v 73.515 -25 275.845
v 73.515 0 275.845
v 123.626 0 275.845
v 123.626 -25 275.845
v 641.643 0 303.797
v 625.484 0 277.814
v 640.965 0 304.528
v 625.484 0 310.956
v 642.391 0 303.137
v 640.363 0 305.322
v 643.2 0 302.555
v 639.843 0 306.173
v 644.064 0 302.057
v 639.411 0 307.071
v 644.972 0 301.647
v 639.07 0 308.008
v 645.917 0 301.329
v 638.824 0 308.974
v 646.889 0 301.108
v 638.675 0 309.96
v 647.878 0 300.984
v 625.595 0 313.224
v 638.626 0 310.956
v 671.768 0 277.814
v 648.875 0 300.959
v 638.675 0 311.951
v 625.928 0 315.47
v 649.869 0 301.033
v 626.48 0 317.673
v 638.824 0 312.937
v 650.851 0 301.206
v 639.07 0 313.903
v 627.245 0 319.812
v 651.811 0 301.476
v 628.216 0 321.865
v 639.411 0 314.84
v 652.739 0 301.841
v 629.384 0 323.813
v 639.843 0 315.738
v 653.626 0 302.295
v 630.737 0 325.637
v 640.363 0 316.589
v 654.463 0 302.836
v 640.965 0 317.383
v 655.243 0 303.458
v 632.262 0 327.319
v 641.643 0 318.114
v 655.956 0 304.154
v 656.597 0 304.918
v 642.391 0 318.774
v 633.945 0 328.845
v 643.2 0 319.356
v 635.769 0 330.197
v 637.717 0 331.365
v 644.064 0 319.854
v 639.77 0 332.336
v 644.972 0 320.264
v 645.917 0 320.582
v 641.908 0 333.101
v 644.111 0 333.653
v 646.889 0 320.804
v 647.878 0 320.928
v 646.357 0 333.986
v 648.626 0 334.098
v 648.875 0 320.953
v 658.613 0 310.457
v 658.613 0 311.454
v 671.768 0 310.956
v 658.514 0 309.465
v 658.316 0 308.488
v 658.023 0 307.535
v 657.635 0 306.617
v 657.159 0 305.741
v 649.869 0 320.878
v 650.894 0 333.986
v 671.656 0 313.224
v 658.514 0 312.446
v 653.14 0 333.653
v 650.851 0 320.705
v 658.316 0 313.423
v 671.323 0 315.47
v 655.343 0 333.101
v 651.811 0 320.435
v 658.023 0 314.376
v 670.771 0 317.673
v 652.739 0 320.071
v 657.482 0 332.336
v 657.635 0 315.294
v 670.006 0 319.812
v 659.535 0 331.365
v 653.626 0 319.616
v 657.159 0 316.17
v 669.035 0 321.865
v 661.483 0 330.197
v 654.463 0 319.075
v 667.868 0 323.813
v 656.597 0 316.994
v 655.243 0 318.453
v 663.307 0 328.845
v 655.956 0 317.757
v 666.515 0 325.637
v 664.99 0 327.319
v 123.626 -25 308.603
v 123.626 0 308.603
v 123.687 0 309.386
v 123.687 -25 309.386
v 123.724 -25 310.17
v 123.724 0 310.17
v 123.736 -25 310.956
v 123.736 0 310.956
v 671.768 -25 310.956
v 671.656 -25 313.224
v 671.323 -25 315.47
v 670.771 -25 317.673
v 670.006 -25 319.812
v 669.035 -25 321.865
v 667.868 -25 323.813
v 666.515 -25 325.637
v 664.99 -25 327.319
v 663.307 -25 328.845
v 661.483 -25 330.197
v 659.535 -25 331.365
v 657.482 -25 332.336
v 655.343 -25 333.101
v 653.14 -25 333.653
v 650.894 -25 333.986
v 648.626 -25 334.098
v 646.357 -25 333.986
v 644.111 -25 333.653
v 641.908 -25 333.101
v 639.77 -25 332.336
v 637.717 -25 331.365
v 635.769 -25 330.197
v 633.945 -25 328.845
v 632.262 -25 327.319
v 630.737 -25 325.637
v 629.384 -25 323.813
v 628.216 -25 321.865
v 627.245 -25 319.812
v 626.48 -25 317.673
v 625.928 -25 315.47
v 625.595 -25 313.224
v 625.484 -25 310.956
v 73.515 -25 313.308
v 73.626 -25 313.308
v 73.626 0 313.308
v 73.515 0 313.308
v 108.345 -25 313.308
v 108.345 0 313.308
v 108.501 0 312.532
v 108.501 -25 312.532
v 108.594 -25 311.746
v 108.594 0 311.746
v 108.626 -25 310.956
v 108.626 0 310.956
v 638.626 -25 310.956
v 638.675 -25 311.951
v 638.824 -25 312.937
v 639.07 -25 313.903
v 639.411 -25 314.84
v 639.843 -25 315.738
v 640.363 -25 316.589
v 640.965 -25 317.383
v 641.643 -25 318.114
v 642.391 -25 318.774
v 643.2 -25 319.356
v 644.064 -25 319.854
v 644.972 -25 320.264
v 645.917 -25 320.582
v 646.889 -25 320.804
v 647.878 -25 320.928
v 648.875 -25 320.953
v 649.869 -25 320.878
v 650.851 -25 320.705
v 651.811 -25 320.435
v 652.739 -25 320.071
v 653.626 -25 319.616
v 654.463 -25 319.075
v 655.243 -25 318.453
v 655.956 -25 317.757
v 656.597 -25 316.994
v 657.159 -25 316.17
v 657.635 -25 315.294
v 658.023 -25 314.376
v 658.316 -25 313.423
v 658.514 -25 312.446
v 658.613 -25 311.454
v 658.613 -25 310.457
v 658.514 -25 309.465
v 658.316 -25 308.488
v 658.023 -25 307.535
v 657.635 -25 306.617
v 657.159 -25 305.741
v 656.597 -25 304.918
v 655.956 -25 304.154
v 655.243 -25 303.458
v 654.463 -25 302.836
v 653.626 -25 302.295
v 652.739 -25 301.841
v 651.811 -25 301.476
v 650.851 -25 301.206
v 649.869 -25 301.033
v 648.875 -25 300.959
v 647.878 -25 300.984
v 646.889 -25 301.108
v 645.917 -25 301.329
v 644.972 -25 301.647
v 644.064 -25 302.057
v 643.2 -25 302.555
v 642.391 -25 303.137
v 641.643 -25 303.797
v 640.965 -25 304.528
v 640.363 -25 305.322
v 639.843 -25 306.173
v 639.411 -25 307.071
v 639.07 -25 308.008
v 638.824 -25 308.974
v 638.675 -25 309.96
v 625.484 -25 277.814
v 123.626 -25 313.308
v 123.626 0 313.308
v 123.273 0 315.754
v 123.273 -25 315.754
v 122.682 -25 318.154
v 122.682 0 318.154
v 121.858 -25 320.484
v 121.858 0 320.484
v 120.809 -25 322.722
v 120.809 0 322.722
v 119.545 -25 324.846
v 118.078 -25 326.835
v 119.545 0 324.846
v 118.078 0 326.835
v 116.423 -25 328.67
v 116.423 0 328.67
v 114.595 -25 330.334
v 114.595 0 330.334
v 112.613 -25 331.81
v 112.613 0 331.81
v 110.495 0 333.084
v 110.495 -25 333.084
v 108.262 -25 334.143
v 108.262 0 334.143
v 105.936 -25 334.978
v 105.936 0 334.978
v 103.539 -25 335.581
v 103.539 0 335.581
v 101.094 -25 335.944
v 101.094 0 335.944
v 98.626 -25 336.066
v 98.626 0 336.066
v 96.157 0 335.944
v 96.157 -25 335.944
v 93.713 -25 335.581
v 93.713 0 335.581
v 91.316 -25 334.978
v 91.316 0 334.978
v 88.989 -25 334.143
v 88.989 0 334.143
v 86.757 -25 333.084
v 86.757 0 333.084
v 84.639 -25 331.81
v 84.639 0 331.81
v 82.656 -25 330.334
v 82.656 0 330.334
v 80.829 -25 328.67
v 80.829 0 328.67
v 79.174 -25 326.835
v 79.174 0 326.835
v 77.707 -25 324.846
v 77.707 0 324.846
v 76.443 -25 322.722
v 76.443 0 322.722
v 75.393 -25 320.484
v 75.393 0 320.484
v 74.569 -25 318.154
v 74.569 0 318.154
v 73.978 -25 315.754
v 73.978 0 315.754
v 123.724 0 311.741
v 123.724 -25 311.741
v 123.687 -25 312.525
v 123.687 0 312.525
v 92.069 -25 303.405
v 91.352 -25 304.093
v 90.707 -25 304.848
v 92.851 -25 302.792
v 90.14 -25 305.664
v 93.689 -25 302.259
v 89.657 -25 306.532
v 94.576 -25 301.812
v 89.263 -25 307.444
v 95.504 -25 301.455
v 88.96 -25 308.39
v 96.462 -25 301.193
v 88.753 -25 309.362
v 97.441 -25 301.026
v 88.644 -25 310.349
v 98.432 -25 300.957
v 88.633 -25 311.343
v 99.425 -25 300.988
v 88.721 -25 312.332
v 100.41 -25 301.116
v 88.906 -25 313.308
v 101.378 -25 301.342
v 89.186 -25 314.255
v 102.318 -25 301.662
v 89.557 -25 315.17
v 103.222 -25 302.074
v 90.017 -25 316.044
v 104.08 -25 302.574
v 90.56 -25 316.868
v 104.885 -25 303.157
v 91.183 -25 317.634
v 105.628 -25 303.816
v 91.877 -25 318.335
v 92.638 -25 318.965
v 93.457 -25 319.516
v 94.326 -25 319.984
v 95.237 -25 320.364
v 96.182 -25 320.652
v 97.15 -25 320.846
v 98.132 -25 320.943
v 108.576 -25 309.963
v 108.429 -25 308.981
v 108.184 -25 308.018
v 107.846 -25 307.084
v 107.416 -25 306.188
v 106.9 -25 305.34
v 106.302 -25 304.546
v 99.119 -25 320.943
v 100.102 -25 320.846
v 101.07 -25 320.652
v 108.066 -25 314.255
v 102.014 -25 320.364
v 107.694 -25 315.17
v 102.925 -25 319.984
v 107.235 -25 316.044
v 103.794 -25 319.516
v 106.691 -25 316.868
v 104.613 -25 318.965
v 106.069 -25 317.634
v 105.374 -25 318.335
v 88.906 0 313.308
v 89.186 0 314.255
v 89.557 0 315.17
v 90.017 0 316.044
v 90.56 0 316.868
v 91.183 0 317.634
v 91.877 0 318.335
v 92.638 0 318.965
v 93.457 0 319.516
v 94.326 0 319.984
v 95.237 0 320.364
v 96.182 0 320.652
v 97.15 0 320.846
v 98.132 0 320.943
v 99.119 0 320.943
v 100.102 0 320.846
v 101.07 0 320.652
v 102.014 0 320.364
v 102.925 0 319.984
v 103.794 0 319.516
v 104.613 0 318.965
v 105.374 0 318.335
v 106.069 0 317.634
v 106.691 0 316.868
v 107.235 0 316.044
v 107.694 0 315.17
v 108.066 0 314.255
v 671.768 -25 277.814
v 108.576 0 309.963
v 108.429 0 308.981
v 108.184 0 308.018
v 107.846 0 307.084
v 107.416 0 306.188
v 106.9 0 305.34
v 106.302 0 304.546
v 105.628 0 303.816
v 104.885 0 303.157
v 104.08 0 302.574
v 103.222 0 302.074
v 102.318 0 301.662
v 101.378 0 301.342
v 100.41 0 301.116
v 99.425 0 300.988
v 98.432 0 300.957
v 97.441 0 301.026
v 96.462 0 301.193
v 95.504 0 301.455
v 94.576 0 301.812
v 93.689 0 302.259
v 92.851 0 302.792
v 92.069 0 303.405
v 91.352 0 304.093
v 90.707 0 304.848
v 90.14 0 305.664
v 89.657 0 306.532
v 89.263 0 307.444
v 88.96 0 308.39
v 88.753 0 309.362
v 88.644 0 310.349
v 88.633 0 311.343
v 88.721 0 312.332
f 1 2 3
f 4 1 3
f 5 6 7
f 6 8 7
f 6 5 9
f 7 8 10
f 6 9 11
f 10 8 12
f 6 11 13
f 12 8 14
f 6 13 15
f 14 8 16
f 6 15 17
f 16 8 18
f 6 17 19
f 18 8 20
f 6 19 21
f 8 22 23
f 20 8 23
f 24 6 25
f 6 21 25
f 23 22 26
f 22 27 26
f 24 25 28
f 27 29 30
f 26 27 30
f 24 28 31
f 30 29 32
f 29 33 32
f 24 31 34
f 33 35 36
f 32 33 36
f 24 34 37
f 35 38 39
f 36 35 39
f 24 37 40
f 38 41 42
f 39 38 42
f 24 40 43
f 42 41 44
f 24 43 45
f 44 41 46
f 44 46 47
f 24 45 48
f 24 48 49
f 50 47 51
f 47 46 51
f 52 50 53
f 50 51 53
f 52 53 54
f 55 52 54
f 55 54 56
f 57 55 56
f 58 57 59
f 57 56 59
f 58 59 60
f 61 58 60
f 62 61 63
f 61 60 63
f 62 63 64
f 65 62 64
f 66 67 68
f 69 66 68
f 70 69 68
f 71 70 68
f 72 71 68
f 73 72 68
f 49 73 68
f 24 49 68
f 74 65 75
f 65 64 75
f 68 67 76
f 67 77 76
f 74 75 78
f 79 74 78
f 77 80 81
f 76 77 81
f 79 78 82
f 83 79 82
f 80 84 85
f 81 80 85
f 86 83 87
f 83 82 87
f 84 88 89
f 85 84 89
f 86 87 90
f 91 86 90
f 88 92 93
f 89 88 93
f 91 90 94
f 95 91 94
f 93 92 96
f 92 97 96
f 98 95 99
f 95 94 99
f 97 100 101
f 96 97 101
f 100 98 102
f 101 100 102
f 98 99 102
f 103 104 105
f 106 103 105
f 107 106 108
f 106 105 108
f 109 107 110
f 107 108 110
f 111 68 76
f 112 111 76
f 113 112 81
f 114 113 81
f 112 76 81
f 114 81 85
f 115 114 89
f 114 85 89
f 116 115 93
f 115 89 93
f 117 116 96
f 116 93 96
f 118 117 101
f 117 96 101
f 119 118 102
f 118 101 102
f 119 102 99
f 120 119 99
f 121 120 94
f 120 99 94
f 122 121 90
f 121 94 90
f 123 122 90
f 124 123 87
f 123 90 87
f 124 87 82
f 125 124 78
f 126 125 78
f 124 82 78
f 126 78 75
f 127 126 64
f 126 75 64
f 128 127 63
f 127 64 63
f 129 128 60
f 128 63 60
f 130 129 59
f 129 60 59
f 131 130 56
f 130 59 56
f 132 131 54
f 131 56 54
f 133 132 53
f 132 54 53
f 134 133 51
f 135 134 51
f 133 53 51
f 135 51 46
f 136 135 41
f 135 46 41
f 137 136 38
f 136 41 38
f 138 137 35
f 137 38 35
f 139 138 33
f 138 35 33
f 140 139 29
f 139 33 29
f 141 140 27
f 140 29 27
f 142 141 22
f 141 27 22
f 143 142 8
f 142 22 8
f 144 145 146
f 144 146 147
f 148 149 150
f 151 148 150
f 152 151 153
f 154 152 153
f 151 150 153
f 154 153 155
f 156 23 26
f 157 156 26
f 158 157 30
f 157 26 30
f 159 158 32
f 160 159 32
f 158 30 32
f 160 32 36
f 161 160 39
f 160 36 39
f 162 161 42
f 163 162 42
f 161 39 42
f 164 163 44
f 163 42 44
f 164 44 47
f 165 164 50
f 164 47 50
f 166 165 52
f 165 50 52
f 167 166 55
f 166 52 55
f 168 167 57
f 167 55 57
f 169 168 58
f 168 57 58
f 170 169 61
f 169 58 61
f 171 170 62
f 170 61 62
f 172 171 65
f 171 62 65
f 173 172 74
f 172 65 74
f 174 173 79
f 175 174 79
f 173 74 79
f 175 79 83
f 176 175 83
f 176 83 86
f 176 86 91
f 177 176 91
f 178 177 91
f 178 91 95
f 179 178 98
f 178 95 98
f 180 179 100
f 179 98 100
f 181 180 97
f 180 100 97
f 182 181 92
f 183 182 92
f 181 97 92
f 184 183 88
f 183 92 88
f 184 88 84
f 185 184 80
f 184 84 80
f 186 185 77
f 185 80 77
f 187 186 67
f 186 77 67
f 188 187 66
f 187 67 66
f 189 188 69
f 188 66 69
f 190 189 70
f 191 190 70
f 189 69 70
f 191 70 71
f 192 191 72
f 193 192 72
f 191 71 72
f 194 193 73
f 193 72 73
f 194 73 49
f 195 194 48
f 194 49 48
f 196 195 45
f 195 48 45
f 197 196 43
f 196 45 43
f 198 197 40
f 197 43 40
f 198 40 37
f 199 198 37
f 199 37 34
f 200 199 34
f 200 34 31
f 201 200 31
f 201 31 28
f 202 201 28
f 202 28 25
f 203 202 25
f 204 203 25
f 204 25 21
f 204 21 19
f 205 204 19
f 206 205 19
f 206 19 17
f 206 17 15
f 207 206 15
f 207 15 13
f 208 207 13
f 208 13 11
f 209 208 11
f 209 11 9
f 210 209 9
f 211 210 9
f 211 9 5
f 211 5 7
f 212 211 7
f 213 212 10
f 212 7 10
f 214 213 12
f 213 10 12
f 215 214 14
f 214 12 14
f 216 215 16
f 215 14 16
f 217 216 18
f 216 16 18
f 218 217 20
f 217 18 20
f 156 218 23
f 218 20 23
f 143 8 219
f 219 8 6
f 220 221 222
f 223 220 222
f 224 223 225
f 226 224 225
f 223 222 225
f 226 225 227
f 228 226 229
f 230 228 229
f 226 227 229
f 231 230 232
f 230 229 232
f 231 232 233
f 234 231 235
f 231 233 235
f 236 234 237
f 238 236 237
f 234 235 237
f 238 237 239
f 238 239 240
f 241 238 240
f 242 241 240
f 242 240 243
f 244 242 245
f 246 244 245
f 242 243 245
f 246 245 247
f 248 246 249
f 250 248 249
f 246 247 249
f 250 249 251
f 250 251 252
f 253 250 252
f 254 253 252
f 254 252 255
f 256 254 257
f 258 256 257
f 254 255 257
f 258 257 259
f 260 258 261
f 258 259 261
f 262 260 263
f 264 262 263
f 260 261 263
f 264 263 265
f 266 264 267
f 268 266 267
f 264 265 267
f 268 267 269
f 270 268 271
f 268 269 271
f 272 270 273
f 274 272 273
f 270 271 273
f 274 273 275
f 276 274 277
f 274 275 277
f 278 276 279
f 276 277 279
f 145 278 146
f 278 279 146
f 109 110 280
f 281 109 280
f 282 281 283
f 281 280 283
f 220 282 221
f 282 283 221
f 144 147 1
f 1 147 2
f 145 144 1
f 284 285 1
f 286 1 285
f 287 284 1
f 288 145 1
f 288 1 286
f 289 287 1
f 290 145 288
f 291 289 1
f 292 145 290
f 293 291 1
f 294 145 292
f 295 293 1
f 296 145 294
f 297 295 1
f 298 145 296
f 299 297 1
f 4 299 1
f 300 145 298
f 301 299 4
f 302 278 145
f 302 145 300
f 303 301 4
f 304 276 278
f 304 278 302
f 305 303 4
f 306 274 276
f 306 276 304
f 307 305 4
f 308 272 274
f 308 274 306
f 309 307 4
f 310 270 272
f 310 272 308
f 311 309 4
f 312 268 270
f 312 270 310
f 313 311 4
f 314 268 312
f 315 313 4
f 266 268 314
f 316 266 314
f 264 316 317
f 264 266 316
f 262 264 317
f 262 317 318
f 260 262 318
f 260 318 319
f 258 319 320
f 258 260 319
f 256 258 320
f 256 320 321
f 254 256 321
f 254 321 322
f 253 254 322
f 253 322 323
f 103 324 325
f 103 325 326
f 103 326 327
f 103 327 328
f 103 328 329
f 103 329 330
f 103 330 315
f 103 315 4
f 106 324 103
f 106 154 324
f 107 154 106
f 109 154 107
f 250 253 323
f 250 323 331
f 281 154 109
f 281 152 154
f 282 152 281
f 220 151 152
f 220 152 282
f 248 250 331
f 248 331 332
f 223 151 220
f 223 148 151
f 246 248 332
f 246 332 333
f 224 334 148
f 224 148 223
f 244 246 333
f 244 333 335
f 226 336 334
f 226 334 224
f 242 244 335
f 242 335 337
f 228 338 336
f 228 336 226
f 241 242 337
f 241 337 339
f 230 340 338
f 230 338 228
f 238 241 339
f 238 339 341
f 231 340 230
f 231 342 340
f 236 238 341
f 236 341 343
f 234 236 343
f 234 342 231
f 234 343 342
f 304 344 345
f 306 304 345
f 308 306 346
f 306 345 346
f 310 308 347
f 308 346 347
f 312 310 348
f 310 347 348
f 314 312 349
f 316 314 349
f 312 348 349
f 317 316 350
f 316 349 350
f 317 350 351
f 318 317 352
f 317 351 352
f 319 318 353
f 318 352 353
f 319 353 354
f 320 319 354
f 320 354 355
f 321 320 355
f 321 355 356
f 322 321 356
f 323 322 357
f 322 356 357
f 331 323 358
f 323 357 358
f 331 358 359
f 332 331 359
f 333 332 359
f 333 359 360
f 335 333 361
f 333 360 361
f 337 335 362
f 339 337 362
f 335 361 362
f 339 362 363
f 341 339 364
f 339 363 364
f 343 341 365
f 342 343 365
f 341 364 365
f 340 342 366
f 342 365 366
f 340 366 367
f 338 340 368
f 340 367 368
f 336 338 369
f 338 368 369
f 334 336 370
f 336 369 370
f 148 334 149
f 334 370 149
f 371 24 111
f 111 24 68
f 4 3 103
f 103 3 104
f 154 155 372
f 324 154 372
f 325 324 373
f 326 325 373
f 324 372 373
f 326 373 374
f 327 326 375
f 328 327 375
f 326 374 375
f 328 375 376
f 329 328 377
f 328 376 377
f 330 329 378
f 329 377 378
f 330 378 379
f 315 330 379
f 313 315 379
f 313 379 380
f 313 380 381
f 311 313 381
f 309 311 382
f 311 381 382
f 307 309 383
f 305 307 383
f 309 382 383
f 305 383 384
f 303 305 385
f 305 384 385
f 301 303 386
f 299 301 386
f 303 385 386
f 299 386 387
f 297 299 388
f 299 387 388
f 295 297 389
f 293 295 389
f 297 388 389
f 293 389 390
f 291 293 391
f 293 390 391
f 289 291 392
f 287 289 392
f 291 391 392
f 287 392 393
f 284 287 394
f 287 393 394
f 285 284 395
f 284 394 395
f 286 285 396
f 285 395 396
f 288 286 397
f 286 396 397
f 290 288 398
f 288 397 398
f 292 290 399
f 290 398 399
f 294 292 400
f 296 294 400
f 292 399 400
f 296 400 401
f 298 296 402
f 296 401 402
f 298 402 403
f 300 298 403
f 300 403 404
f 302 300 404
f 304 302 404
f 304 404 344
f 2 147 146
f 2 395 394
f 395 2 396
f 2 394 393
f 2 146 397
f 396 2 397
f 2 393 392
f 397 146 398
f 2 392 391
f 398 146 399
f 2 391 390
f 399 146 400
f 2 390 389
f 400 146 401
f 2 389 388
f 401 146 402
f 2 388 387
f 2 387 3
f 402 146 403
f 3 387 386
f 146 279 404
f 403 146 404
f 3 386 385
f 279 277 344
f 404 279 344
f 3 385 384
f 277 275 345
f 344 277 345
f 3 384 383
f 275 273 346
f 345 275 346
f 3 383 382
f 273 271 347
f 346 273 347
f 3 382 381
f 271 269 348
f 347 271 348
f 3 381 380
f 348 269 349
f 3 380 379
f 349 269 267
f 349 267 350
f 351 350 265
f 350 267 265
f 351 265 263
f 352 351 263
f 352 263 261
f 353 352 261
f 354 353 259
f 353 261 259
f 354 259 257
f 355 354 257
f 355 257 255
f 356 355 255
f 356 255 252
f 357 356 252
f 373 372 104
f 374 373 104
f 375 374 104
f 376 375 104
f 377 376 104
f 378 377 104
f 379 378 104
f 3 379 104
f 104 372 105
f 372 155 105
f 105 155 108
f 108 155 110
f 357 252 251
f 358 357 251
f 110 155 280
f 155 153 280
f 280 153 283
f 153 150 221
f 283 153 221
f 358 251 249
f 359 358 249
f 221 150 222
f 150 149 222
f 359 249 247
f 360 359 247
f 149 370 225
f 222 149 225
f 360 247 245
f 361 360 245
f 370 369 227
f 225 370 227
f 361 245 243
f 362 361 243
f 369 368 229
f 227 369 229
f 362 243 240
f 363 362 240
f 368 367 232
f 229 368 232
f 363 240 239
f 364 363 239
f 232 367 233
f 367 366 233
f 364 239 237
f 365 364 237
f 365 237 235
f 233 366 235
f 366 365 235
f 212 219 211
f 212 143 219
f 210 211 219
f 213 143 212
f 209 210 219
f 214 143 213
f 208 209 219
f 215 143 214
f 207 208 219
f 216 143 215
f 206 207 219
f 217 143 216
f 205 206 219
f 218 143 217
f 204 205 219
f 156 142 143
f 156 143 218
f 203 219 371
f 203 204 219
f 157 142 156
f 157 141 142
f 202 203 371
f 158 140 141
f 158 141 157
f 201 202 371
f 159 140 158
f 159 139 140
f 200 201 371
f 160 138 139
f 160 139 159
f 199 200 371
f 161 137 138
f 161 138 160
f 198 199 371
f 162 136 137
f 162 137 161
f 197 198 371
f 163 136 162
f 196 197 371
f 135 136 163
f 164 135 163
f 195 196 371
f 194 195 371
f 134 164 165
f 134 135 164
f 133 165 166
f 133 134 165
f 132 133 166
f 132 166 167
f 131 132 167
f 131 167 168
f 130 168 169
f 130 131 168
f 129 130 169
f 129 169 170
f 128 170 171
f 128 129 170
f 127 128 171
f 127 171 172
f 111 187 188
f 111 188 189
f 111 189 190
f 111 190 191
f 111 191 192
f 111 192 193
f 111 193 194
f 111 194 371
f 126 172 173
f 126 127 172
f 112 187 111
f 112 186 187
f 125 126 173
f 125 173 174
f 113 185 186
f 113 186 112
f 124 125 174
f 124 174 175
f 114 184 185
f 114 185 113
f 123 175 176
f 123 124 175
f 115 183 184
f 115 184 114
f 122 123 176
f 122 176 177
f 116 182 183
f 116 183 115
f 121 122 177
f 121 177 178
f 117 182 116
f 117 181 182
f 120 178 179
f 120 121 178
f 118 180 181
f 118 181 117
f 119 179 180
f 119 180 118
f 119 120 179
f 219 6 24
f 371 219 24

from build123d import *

# Parameters (mm, degrees)
F1_DEPTH = 25


with BuildPart() as f1:
    # F0 (on Front) → F1 (new body)
    with BuildSketch(Plane.XZ):
        with BuildLine():
            ThreePointArc((108.3450048389, 313.3082091808), (108.5552612229, 312.1402568267), (108.6256772453, 310.9556210041))
            ThreePointArc((108.6256772453, 310.9556210041), (97.4410414227, 301.0260370265), (88.9063496518, 313.3082091808))
            Line((88.9063496518, 313.3082091808), (73.6256772453, 313.3082091808))
            ThreePointArc((73.6256772453, 313.3082091808), (73.5428553631, 312.1332107256), (73.5152278043, 310.9556210041))
            ThreePointArc((73.5152278043, 310.9556210041), (97.4480875239, 285.8727991218), (123.6256772453, 308.6030328274))
            Line((123.6256772453, 308.6030328274), (123.6256772453, 313.3082091808))
            Line((123.6256772453, 313.3082091808), (108.3450048389, 313.3082091808))
        make_face()
        with BuildLine():
            ThreePointArc((88.9063496518, 313.3082091808), (98.6256772453, 320.9556210041), (108.3450048389, 313.3082091808))
            Line((108.3450048389, 313.3082091808), (123.6256772453, 313.3082091808))
            ThreePointArc((123.6256772453, 313.3082091808), (98.6256772453, 336.0660704451), (73.6256772453, 313.3082091808))
            Line((73.6256772453, 313.3082091808), (88.9063496518, 313.3082091808))
        make_face()
        with BuildLine():
            ThreePointArc((123.7361266863, 310.9556210041), (123.7084991276, 312.1332107256), (123.6256772453, 313.3082091808))
            Line((123.6256772453, 313.3082091808), (123.6256772453, 308.6030328274))
            ThreePointArc((123.6256772453, 308.6030328274), (123.7084991276, 309.7780312827), (123.7361266863, 310.9556210041))
        make_face()
        with BuildLine():
            ThreePointArc((73.5152278043, 310.9556210041), (73.5428553631, 312.1332107256), (73.6256772453, 313.3082091808))
            Line((73.6256772453, 313.3082091808), (73.5152278043, 313.3082091808))
            Line((73.5152278043, 313.3082091808), (73.5152278043, 310.9556210041))
        make_face()
        with BuildLine():
            Line((123.6256772453, 275.8451715631), (123.6256772453, 308.6030328274))
            ThreePointArc((123.6256772453, 308.6030328274), (97.4480875239, 285.8727991218), (73.5152278043, 310.9556210041))
            Line((73.5152278043, 310.9556210041), (73.5152278043, 275.8451715631))
            Line((73.5152278043, 275.8451715631), (123.6256772453, 275.8451715631))
        make_face()
    extrude(amount=F1_DEPTH)


with BuildPart() as f1b:
    # F0 (on Front) → F1, piece 2 (new body)
    with BuildSketch(Plane.XZ):
        with BuildLine():
            Line((671.7676395361, 310.9556210041), (658.6256772453, 310.9556210041))
            ThreePointArc((658.6256772453, 310.9556210041), (648.6256772453, 300.9556210041), (638.6256772453, 310.9556210041))
            Line((638.6256772453, 310.9556210041), (625.4837149546, 310.9556210041))
            ThreePointArc((625.4837149546, 310.9556210041), (648.6256772453, 287.8136587134), (671.7676395361, 310.9556210041))
        make_face()
        with BuildLine():
            ThreePointArc((638.6256772453, 310.9556210041), (648.6256772453, 320.9556210041), (658.6256772453, 310.9556210041))
            Line((658.6256772453, 310.9556210041), (671.7676395361, 310.9556210041))
            ThreePointArc((671.7676395361, 310.9556210041), (648.6256772453, 334.0975832948), (625.4837149546, 310.9556210041))
            Line((625.4837149546, 310.9556210041), (638.6256772453, 310.9556210041))
        make_face()
        with BuildLine():
            Line((671.7676395361, 277.8136587134), (671.7676395361, 310.9556210041))
            ThreePointArc((671.7676395361, 310.9556210041), (648.6256772453, 287.8136587134), (625.4837149546, 310.9556210041))
            Line((625.4837149546, 310.9556210041), (625.4837149546, 277.8136587134))
            Line((625.4837149546, 277.8136587134), (671.7676395361, 277.8136587134))
        make_face()
    extrude(amount=F1_DEPTH)


solid = Compound([f1.part, f1b.part])
